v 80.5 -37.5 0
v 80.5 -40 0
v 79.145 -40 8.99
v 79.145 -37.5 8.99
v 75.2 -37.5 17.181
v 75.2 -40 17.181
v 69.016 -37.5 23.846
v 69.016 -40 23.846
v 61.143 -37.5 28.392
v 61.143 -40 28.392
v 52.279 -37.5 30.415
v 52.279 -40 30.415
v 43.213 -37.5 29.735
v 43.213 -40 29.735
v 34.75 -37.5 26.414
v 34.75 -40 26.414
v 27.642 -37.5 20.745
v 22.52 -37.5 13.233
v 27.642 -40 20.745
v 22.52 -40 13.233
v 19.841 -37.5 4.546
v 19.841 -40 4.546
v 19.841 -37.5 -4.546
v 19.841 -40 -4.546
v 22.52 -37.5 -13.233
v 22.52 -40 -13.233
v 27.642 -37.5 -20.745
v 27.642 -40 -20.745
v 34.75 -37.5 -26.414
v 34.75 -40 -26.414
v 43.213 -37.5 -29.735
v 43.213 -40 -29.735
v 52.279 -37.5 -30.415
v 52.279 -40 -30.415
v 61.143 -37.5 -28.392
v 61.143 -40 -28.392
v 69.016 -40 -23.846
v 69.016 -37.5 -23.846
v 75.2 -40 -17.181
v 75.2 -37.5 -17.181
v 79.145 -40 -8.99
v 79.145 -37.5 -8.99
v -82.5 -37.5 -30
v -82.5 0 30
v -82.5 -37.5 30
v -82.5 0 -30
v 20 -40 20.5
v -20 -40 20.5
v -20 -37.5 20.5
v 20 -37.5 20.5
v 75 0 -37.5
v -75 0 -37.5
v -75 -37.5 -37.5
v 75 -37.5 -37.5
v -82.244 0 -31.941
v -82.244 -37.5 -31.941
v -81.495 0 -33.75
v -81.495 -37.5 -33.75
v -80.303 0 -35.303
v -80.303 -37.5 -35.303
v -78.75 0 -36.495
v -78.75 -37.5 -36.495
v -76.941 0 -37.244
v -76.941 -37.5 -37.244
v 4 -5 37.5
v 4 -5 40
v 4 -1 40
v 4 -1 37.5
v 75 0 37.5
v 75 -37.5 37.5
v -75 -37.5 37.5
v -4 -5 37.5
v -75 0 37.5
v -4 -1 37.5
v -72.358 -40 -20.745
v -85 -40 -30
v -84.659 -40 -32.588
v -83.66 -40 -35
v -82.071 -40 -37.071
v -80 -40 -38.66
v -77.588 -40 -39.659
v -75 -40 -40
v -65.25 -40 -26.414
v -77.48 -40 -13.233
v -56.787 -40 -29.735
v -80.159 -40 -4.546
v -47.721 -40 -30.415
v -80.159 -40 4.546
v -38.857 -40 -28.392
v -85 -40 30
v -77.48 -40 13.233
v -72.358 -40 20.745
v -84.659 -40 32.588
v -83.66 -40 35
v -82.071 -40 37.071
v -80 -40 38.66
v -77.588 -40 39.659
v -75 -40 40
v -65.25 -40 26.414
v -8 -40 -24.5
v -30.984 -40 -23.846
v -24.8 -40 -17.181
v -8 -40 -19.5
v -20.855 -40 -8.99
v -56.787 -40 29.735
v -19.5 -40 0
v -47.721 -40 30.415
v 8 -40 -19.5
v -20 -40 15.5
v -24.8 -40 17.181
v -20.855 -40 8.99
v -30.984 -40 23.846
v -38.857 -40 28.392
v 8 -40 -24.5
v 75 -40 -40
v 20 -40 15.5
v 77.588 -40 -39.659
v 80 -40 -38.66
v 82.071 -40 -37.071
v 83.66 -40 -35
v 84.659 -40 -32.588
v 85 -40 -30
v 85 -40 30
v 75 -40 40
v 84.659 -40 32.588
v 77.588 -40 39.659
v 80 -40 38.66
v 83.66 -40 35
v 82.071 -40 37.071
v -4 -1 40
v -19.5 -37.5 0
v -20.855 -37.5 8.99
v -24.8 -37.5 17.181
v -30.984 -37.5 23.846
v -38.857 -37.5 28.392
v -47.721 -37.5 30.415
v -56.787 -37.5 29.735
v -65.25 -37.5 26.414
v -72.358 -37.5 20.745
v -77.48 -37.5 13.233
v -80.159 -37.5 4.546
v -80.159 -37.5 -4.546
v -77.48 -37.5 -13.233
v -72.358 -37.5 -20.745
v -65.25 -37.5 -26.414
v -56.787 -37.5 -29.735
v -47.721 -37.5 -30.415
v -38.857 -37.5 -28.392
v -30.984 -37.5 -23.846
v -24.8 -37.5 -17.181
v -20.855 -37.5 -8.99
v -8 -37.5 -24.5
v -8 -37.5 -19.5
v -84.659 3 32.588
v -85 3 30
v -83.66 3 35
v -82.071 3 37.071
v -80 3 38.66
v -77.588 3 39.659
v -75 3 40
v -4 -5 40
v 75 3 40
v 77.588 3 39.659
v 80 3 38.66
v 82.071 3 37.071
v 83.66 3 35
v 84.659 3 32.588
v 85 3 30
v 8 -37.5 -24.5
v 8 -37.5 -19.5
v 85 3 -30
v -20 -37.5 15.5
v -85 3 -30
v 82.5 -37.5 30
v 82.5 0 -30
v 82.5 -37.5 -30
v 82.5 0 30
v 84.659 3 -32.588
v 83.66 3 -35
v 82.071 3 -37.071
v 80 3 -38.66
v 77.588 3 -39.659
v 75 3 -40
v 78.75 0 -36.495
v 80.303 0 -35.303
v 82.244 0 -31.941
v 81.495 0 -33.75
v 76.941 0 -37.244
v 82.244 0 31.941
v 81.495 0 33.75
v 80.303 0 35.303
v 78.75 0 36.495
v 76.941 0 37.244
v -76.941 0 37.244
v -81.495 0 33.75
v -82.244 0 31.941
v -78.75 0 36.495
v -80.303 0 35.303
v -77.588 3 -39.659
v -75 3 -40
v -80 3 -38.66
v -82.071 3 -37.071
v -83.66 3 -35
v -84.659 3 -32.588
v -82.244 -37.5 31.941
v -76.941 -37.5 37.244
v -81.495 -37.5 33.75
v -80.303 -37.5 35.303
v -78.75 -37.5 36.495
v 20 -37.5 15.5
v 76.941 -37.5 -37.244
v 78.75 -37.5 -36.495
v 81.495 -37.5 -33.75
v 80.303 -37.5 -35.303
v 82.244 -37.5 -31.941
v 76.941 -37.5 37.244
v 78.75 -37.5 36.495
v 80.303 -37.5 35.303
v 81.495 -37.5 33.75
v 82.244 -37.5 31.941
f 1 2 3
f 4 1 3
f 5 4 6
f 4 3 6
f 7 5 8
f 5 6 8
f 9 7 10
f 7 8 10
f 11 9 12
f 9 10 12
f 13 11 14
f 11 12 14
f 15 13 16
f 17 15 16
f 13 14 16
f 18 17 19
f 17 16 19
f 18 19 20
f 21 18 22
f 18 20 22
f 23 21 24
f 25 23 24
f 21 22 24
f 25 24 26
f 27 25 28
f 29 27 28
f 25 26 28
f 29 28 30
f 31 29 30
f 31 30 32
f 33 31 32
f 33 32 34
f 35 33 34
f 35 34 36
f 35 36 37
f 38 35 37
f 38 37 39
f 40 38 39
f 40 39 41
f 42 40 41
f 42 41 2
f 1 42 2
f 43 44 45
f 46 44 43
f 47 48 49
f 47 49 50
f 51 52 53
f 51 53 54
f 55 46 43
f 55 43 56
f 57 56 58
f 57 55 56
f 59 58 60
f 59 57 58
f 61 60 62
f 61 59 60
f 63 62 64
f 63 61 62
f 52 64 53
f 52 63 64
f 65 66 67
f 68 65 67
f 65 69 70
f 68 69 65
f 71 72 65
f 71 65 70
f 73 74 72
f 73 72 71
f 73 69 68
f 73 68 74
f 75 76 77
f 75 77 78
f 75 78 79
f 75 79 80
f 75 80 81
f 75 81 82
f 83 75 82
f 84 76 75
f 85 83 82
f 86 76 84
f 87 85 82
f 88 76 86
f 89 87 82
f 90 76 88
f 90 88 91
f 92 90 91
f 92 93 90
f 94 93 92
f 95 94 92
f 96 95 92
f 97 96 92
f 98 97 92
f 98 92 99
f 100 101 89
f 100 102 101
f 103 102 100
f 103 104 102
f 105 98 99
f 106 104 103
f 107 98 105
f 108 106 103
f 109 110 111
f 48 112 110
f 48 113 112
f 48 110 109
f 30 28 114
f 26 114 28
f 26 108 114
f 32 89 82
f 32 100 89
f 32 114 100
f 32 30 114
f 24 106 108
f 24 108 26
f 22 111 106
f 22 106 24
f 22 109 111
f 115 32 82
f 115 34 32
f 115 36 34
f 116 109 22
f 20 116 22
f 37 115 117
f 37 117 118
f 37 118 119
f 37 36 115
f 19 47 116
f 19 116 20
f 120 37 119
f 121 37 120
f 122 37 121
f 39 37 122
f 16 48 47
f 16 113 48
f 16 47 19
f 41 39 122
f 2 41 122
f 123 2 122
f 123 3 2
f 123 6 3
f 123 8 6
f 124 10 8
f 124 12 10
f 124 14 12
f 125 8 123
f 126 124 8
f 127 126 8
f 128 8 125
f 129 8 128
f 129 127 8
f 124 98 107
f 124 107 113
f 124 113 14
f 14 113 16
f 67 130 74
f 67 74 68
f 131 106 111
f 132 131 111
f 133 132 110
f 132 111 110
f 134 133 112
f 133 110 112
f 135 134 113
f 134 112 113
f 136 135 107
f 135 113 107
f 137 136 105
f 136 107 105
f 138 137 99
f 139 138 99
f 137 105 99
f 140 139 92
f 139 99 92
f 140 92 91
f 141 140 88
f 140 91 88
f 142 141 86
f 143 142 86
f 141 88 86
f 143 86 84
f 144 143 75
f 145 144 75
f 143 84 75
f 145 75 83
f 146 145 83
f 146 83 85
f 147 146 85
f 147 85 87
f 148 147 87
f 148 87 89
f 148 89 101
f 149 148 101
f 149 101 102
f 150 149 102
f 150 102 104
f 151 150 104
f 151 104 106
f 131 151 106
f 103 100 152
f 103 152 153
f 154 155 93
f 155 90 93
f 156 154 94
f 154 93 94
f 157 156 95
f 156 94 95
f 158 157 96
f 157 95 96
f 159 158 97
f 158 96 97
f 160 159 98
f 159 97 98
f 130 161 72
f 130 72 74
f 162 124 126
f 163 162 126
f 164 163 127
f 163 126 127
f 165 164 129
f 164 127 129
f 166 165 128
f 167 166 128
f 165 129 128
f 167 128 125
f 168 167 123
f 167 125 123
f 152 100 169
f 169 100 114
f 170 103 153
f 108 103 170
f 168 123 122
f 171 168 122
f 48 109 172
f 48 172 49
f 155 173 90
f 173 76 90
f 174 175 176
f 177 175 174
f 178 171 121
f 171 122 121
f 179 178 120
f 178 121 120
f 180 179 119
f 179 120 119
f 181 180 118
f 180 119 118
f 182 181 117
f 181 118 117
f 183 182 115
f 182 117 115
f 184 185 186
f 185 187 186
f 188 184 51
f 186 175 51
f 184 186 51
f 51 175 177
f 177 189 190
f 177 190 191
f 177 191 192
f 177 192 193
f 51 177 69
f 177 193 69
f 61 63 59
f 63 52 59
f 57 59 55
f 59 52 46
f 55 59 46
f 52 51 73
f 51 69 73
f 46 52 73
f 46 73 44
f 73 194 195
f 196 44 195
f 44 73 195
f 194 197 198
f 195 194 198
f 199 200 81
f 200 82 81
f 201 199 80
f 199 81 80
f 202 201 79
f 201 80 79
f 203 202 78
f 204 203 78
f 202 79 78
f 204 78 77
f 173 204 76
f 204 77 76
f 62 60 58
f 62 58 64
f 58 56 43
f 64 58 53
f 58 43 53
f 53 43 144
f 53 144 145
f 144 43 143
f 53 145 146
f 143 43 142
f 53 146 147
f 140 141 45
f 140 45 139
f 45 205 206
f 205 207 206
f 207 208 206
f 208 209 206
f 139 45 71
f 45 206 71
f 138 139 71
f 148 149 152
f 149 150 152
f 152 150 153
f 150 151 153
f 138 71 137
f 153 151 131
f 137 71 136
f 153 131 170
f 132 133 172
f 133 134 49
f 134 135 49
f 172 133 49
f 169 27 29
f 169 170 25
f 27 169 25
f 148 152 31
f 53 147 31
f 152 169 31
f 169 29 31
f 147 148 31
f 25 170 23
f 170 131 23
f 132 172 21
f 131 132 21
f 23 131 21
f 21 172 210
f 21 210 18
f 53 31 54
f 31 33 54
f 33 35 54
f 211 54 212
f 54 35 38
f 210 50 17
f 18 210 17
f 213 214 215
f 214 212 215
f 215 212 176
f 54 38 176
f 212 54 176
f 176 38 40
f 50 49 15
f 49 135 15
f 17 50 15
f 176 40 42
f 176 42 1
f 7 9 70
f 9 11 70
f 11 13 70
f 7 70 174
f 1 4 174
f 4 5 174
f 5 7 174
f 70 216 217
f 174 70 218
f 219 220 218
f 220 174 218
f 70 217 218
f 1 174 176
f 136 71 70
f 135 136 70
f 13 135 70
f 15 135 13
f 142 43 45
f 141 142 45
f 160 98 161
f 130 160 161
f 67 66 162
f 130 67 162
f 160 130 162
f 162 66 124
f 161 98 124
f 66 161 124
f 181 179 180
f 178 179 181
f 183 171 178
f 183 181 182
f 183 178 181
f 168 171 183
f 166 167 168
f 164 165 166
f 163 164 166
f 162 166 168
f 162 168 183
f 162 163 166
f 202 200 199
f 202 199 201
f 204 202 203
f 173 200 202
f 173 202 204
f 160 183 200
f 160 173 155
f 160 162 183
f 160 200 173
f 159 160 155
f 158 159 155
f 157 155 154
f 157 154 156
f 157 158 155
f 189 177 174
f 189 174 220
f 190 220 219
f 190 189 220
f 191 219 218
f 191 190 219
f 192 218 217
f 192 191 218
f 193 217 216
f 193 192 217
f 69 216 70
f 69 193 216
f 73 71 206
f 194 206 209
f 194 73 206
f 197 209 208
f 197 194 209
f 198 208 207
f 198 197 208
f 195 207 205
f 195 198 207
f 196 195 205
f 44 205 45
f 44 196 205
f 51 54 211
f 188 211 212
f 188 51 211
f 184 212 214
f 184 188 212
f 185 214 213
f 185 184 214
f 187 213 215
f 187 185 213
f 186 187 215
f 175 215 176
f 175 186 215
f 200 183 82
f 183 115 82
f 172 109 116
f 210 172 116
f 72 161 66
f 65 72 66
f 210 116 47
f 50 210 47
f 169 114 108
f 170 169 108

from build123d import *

# Parameters (mm, degrees)
F1_DEPTH  = 40
F2_T      = -2.5
F3_R      = 30.5
F4_DEPTH  = 5
F6_DEPTH  = 3
F7_W      = 40
F7_H      = 5
F8_DEPTH  = 5
F9_W      = 16
F9_H      = 5
F10_DEPTH = 5
F11_W     = 8
F11_H     = 4
F12_DEPTH = 2.5


with BuildPart() as f1:
    # F0 (on Front) → F1 (new body)
    with BuildSketch(Plane.XZ):
        with BuildLine():
            ThreePointArc((85, 30), (82.0710678119, 37.0710678119), (75, 40))
            Line((75, 40), (-75, 40))
            ThreePointArc((-75, 40), (-82.0710678119, 37.0710678119), (-85, 30))
            Line((-85, 30), (-85, -30))
            ThreePointArc((-85, -30), (-82.0710678119, -37.0710678119), (-75, -40))
            Line((-75, -40), (75, -40))
            ThreePointArc((75, -40), (82.0710678119, -37.0710678119), (85, -30))
            Line((85, -30), (85, 30))
        make_face()
    extrude(amount=F1_DEPTH)

    # F2
    f2_openings = [f1.faces().sort_by_distance(p)[0] for p in [
        (0, 0, 0),
    ]]
    offset(amount=F2_T, openings=f2_openings)

    # F3 (on face) → F4 (cut)
    with BuildSketch(Plane.XZ.offset(40)):
        with Locations((-50, 0)):
            Circle(F3_R)
        with Locations((50, 0)):
            Circle(F3_R)
    extrude(amount=-F4_DEPTH, mode=Mode.SUBTRACT)

    # F5 (on face) → F6 (join)
    with BuildSketch(Plane(origin=(0, 0, 0), x_dir=(-1, 0, 0), z_dir=(0, 1, 0))):
        with BuildLine():
            Line((-85, 30), (-85, -30))
            ThreePointArc((-85, -30), (-82.0710678119, -37.0710678119), (-75, -40))
            Line((-75, -40), (75, -40))
            ThreePointArc((75, -40), (82.0710678119, -37.0710678119), (85, -30))
            Line((85, -30), (85, 30))
            ThreePointArc((85, 30), (82.0710678119, 37.0710678119), (75, 40))
            Line((75, 40), (-75, 40))
            ThreePointArc((-75, 40), (-82.0710678119, 37.0710678119), (-85, 30))
        make_face()
        with BuildLine():
            Line((75, -37.5), (-75, -37.5))
            ThreePointArc((-75, -37.5), (-80.3033008589, -35.3033008589), (-82.5, -30))
            Line((-82.5, -30), (-82.5, 30))
            ThreePointArc((-82.5, 30), (-80.3033008589, 35.3033008589), (-75, 37.5))
            Line((-75, 37.5), (75, 37.5))
            ThreePointArc((75, 37.5), (80.3033008589, 35.3033008589), (82.5, 30))
            Line((82.5, 30), (82.5, -30))
            ThreePointArc((82.5, -30), (80.3033008589, -35.3033008589), (75, -37.5))
        make_face(mode=Mode.SUBTRACT)
        with BuildLine():
            ThreePointArc((-82.5, -30), (-80.3033008589, -35.3033008589), (-75, -37.5))
            Line((-75, -37.5), (75, -37.5))
            ThreePointArc((75, -37.5), (80.3033008589, -35.3033008589), (82.5, -30))
            Line((82.5, -30), (82.5, 30))
            ThreePointArc((82.5, 30), (80.3033008589, 35.3033008589), (75, 37.5))
            Line((75, 37.5), (-75, 37.5))
            ThreePointArc((-75, 37.5), (-80.3033008589, 35.3033008589), (-82.5, 30))
            Line((-82.5, 30), (-82.5, -30))
        make_face()
    extrude(amount=F6_DEPTH)

    # F7 (on face) → F8 (cut)
    with BuildSketch(Plane.XZ.offset(40)):
        with Locations((0, 18)):
            Rectangle(F7_W, F7_H)
    extrude(amount=-F8_DEPTH, mode=Mode.SUBTRACT)

    # F9 (on face) → F10 (cut)
    with BuildSketch(Plane.XZ.offset(40)):
        with Locations((0, -22)):
            Rectangle(F9_W, F9_H)
    extrude(amount=-F10_DEPTH, mode=Mode.SUBTRACT)

    # F11 (on face) → F12 (cut)
    with BuildSketch(Plane.XY.offset(40)):
        with Locations((0, -3)):
            Rectangle(F11_W, F11_H)
    extrude(amount=-F12_DEPTH, mode=Mode.SUBTRACT)


solid = f1.part
